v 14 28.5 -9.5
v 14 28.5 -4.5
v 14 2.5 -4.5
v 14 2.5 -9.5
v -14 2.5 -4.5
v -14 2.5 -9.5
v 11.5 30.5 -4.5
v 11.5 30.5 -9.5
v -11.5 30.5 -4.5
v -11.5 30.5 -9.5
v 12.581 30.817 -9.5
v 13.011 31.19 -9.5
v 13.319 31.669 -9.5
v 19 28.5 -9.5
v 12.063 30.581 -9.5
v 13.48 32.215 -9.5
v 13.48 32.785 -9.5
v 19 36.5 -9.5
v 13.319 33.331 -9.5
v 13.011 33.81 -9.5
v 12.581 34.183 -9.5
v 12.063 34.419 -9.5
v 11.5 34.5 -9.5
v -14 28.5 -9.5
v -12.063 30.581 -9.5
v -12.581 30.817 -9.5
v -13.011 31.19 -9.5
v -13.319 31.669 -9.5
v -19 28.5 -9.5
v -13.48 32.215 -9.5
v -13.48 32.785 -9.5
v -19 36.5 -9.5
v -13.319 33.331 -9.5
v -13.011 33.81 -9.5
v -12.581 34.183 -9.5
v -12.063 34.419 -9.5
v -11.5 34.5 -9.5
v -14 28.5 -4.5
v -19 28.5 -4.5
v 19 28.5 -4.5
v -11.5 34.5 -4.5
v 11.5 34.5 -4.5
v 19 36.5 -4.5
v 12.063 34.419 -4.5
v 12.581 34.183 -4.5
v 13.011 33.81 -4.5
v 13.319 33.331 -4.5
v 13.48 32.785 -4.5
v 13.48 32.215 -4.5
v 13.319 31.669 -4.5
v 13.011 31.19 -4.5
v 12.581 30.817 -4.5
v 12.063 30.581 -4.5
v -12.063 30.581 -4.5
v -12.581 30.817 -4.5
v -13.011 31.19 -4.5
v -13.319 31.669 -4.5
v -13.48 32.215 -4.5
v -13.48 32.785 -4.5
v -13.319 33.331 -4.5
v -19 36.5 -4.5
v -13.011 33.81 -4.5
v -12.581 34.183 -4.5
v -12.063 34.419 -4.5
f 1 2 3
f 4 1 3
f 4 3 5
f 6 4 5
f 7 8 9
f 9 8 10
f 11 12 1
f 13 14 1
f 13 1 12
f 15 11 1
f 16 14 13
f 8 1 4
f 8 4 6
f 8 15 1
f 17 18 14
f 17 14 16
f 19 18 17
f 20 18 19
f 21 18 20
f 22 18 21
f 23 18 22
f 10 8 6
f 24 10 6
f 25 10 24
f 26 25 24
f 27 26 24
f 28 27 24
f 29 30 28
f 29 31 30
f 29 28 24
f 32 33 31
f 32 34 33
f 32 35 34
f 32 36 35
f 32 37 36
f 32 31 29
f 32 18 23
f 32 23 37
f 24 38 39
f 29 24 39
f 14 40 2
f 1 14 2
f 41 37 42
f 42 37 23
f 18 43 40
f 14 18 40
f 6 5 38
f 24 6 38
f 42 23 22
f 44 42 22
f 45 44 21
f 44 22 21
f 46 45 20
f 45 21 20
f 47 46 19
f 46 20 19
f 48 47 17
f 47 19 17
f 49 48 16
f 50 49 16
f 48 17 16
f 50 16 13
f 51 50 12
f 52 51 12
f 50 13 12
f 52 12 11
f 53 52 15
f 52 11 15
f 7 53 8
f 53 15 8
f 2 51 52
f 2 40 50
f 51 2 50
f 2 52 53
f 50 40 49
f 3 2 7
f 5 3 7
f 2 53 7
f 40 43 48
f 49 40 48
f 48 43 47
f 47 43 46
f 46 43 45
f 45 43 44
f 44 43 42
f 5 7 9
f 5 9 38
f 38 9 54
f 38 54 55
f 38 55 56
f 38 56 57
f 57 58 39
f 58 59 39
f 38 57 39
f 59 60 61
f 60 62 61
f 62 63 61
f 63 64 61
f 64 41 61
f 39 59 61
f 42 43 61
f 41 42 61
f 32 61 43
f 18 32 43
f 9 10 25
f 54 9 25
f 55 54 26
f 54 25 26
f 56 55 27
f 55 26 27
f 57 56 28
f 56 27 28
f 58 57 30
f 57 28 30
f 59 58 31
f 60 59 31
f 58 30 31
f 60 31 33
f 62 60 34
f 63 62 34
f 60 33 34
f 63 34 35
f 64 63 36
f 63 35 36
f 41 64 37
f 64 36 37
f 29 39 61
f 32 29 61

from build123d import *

# Parameters (mm, degrees)
CORPS_VERROU_GUILLOTINE_START         = -4.5
CORPS_VERROU_GUILLOTINE_DEPTH         = 5
LUMIERE_OBLONGUE_MANIVELLE_DEPTH      = 43.231504828
LUMIERE_OBLONGUE_MANIVELLE_DEPTH_BACK = 43.231504828


with BuildPart() as part:
    # Esquisse1 → Corps_verrou_guillotine (new body)
    with BuildSketch(Plane.XY.offset(CORPS_VERROU_GUILLOTINE_START)):
        Polygon((-19, 36.5), (19, 36.5), (19, 28.5), (14, 28.5), (14, 2.5), (-14, 2.5), (-14, 28.5), (-19, 28.5), align=None)
    extrude(amount=-CORPS_VERROU_GUILLOTINE_DEPTH)

    # Esquisse2 → Lumiere_oblongue_manivelle (cut, two sides: drawn at the far end of the back side and taken through both)
    with BuildSketch(Plane.XY.offset(-LUMIERE_OBLONGUE_MANIVELLE_DEPTH_BACK)):
        with BuildLine():
            Line((-11.5, 34.5), (11.5, 34.5))
            ThreePointArc((11.5, 34.5), (13.5, 32.5), (11.5, 30.5))
            Line((11.5, 30.5), (-11.5, 30.5))
            ThreePointArc((-11.5, 30.5), (-13.5, 32.5), (-11.5, 34.5))
        make_face()
    extrude(amount=LUMIERE_OBLONGUE_MANIVELLE_DEPTH + LUMIERE_OBLONGUE_MANIVELLE_DEPTH_BACK, mode=Mode.SUBTRACT)


solid = part.part
